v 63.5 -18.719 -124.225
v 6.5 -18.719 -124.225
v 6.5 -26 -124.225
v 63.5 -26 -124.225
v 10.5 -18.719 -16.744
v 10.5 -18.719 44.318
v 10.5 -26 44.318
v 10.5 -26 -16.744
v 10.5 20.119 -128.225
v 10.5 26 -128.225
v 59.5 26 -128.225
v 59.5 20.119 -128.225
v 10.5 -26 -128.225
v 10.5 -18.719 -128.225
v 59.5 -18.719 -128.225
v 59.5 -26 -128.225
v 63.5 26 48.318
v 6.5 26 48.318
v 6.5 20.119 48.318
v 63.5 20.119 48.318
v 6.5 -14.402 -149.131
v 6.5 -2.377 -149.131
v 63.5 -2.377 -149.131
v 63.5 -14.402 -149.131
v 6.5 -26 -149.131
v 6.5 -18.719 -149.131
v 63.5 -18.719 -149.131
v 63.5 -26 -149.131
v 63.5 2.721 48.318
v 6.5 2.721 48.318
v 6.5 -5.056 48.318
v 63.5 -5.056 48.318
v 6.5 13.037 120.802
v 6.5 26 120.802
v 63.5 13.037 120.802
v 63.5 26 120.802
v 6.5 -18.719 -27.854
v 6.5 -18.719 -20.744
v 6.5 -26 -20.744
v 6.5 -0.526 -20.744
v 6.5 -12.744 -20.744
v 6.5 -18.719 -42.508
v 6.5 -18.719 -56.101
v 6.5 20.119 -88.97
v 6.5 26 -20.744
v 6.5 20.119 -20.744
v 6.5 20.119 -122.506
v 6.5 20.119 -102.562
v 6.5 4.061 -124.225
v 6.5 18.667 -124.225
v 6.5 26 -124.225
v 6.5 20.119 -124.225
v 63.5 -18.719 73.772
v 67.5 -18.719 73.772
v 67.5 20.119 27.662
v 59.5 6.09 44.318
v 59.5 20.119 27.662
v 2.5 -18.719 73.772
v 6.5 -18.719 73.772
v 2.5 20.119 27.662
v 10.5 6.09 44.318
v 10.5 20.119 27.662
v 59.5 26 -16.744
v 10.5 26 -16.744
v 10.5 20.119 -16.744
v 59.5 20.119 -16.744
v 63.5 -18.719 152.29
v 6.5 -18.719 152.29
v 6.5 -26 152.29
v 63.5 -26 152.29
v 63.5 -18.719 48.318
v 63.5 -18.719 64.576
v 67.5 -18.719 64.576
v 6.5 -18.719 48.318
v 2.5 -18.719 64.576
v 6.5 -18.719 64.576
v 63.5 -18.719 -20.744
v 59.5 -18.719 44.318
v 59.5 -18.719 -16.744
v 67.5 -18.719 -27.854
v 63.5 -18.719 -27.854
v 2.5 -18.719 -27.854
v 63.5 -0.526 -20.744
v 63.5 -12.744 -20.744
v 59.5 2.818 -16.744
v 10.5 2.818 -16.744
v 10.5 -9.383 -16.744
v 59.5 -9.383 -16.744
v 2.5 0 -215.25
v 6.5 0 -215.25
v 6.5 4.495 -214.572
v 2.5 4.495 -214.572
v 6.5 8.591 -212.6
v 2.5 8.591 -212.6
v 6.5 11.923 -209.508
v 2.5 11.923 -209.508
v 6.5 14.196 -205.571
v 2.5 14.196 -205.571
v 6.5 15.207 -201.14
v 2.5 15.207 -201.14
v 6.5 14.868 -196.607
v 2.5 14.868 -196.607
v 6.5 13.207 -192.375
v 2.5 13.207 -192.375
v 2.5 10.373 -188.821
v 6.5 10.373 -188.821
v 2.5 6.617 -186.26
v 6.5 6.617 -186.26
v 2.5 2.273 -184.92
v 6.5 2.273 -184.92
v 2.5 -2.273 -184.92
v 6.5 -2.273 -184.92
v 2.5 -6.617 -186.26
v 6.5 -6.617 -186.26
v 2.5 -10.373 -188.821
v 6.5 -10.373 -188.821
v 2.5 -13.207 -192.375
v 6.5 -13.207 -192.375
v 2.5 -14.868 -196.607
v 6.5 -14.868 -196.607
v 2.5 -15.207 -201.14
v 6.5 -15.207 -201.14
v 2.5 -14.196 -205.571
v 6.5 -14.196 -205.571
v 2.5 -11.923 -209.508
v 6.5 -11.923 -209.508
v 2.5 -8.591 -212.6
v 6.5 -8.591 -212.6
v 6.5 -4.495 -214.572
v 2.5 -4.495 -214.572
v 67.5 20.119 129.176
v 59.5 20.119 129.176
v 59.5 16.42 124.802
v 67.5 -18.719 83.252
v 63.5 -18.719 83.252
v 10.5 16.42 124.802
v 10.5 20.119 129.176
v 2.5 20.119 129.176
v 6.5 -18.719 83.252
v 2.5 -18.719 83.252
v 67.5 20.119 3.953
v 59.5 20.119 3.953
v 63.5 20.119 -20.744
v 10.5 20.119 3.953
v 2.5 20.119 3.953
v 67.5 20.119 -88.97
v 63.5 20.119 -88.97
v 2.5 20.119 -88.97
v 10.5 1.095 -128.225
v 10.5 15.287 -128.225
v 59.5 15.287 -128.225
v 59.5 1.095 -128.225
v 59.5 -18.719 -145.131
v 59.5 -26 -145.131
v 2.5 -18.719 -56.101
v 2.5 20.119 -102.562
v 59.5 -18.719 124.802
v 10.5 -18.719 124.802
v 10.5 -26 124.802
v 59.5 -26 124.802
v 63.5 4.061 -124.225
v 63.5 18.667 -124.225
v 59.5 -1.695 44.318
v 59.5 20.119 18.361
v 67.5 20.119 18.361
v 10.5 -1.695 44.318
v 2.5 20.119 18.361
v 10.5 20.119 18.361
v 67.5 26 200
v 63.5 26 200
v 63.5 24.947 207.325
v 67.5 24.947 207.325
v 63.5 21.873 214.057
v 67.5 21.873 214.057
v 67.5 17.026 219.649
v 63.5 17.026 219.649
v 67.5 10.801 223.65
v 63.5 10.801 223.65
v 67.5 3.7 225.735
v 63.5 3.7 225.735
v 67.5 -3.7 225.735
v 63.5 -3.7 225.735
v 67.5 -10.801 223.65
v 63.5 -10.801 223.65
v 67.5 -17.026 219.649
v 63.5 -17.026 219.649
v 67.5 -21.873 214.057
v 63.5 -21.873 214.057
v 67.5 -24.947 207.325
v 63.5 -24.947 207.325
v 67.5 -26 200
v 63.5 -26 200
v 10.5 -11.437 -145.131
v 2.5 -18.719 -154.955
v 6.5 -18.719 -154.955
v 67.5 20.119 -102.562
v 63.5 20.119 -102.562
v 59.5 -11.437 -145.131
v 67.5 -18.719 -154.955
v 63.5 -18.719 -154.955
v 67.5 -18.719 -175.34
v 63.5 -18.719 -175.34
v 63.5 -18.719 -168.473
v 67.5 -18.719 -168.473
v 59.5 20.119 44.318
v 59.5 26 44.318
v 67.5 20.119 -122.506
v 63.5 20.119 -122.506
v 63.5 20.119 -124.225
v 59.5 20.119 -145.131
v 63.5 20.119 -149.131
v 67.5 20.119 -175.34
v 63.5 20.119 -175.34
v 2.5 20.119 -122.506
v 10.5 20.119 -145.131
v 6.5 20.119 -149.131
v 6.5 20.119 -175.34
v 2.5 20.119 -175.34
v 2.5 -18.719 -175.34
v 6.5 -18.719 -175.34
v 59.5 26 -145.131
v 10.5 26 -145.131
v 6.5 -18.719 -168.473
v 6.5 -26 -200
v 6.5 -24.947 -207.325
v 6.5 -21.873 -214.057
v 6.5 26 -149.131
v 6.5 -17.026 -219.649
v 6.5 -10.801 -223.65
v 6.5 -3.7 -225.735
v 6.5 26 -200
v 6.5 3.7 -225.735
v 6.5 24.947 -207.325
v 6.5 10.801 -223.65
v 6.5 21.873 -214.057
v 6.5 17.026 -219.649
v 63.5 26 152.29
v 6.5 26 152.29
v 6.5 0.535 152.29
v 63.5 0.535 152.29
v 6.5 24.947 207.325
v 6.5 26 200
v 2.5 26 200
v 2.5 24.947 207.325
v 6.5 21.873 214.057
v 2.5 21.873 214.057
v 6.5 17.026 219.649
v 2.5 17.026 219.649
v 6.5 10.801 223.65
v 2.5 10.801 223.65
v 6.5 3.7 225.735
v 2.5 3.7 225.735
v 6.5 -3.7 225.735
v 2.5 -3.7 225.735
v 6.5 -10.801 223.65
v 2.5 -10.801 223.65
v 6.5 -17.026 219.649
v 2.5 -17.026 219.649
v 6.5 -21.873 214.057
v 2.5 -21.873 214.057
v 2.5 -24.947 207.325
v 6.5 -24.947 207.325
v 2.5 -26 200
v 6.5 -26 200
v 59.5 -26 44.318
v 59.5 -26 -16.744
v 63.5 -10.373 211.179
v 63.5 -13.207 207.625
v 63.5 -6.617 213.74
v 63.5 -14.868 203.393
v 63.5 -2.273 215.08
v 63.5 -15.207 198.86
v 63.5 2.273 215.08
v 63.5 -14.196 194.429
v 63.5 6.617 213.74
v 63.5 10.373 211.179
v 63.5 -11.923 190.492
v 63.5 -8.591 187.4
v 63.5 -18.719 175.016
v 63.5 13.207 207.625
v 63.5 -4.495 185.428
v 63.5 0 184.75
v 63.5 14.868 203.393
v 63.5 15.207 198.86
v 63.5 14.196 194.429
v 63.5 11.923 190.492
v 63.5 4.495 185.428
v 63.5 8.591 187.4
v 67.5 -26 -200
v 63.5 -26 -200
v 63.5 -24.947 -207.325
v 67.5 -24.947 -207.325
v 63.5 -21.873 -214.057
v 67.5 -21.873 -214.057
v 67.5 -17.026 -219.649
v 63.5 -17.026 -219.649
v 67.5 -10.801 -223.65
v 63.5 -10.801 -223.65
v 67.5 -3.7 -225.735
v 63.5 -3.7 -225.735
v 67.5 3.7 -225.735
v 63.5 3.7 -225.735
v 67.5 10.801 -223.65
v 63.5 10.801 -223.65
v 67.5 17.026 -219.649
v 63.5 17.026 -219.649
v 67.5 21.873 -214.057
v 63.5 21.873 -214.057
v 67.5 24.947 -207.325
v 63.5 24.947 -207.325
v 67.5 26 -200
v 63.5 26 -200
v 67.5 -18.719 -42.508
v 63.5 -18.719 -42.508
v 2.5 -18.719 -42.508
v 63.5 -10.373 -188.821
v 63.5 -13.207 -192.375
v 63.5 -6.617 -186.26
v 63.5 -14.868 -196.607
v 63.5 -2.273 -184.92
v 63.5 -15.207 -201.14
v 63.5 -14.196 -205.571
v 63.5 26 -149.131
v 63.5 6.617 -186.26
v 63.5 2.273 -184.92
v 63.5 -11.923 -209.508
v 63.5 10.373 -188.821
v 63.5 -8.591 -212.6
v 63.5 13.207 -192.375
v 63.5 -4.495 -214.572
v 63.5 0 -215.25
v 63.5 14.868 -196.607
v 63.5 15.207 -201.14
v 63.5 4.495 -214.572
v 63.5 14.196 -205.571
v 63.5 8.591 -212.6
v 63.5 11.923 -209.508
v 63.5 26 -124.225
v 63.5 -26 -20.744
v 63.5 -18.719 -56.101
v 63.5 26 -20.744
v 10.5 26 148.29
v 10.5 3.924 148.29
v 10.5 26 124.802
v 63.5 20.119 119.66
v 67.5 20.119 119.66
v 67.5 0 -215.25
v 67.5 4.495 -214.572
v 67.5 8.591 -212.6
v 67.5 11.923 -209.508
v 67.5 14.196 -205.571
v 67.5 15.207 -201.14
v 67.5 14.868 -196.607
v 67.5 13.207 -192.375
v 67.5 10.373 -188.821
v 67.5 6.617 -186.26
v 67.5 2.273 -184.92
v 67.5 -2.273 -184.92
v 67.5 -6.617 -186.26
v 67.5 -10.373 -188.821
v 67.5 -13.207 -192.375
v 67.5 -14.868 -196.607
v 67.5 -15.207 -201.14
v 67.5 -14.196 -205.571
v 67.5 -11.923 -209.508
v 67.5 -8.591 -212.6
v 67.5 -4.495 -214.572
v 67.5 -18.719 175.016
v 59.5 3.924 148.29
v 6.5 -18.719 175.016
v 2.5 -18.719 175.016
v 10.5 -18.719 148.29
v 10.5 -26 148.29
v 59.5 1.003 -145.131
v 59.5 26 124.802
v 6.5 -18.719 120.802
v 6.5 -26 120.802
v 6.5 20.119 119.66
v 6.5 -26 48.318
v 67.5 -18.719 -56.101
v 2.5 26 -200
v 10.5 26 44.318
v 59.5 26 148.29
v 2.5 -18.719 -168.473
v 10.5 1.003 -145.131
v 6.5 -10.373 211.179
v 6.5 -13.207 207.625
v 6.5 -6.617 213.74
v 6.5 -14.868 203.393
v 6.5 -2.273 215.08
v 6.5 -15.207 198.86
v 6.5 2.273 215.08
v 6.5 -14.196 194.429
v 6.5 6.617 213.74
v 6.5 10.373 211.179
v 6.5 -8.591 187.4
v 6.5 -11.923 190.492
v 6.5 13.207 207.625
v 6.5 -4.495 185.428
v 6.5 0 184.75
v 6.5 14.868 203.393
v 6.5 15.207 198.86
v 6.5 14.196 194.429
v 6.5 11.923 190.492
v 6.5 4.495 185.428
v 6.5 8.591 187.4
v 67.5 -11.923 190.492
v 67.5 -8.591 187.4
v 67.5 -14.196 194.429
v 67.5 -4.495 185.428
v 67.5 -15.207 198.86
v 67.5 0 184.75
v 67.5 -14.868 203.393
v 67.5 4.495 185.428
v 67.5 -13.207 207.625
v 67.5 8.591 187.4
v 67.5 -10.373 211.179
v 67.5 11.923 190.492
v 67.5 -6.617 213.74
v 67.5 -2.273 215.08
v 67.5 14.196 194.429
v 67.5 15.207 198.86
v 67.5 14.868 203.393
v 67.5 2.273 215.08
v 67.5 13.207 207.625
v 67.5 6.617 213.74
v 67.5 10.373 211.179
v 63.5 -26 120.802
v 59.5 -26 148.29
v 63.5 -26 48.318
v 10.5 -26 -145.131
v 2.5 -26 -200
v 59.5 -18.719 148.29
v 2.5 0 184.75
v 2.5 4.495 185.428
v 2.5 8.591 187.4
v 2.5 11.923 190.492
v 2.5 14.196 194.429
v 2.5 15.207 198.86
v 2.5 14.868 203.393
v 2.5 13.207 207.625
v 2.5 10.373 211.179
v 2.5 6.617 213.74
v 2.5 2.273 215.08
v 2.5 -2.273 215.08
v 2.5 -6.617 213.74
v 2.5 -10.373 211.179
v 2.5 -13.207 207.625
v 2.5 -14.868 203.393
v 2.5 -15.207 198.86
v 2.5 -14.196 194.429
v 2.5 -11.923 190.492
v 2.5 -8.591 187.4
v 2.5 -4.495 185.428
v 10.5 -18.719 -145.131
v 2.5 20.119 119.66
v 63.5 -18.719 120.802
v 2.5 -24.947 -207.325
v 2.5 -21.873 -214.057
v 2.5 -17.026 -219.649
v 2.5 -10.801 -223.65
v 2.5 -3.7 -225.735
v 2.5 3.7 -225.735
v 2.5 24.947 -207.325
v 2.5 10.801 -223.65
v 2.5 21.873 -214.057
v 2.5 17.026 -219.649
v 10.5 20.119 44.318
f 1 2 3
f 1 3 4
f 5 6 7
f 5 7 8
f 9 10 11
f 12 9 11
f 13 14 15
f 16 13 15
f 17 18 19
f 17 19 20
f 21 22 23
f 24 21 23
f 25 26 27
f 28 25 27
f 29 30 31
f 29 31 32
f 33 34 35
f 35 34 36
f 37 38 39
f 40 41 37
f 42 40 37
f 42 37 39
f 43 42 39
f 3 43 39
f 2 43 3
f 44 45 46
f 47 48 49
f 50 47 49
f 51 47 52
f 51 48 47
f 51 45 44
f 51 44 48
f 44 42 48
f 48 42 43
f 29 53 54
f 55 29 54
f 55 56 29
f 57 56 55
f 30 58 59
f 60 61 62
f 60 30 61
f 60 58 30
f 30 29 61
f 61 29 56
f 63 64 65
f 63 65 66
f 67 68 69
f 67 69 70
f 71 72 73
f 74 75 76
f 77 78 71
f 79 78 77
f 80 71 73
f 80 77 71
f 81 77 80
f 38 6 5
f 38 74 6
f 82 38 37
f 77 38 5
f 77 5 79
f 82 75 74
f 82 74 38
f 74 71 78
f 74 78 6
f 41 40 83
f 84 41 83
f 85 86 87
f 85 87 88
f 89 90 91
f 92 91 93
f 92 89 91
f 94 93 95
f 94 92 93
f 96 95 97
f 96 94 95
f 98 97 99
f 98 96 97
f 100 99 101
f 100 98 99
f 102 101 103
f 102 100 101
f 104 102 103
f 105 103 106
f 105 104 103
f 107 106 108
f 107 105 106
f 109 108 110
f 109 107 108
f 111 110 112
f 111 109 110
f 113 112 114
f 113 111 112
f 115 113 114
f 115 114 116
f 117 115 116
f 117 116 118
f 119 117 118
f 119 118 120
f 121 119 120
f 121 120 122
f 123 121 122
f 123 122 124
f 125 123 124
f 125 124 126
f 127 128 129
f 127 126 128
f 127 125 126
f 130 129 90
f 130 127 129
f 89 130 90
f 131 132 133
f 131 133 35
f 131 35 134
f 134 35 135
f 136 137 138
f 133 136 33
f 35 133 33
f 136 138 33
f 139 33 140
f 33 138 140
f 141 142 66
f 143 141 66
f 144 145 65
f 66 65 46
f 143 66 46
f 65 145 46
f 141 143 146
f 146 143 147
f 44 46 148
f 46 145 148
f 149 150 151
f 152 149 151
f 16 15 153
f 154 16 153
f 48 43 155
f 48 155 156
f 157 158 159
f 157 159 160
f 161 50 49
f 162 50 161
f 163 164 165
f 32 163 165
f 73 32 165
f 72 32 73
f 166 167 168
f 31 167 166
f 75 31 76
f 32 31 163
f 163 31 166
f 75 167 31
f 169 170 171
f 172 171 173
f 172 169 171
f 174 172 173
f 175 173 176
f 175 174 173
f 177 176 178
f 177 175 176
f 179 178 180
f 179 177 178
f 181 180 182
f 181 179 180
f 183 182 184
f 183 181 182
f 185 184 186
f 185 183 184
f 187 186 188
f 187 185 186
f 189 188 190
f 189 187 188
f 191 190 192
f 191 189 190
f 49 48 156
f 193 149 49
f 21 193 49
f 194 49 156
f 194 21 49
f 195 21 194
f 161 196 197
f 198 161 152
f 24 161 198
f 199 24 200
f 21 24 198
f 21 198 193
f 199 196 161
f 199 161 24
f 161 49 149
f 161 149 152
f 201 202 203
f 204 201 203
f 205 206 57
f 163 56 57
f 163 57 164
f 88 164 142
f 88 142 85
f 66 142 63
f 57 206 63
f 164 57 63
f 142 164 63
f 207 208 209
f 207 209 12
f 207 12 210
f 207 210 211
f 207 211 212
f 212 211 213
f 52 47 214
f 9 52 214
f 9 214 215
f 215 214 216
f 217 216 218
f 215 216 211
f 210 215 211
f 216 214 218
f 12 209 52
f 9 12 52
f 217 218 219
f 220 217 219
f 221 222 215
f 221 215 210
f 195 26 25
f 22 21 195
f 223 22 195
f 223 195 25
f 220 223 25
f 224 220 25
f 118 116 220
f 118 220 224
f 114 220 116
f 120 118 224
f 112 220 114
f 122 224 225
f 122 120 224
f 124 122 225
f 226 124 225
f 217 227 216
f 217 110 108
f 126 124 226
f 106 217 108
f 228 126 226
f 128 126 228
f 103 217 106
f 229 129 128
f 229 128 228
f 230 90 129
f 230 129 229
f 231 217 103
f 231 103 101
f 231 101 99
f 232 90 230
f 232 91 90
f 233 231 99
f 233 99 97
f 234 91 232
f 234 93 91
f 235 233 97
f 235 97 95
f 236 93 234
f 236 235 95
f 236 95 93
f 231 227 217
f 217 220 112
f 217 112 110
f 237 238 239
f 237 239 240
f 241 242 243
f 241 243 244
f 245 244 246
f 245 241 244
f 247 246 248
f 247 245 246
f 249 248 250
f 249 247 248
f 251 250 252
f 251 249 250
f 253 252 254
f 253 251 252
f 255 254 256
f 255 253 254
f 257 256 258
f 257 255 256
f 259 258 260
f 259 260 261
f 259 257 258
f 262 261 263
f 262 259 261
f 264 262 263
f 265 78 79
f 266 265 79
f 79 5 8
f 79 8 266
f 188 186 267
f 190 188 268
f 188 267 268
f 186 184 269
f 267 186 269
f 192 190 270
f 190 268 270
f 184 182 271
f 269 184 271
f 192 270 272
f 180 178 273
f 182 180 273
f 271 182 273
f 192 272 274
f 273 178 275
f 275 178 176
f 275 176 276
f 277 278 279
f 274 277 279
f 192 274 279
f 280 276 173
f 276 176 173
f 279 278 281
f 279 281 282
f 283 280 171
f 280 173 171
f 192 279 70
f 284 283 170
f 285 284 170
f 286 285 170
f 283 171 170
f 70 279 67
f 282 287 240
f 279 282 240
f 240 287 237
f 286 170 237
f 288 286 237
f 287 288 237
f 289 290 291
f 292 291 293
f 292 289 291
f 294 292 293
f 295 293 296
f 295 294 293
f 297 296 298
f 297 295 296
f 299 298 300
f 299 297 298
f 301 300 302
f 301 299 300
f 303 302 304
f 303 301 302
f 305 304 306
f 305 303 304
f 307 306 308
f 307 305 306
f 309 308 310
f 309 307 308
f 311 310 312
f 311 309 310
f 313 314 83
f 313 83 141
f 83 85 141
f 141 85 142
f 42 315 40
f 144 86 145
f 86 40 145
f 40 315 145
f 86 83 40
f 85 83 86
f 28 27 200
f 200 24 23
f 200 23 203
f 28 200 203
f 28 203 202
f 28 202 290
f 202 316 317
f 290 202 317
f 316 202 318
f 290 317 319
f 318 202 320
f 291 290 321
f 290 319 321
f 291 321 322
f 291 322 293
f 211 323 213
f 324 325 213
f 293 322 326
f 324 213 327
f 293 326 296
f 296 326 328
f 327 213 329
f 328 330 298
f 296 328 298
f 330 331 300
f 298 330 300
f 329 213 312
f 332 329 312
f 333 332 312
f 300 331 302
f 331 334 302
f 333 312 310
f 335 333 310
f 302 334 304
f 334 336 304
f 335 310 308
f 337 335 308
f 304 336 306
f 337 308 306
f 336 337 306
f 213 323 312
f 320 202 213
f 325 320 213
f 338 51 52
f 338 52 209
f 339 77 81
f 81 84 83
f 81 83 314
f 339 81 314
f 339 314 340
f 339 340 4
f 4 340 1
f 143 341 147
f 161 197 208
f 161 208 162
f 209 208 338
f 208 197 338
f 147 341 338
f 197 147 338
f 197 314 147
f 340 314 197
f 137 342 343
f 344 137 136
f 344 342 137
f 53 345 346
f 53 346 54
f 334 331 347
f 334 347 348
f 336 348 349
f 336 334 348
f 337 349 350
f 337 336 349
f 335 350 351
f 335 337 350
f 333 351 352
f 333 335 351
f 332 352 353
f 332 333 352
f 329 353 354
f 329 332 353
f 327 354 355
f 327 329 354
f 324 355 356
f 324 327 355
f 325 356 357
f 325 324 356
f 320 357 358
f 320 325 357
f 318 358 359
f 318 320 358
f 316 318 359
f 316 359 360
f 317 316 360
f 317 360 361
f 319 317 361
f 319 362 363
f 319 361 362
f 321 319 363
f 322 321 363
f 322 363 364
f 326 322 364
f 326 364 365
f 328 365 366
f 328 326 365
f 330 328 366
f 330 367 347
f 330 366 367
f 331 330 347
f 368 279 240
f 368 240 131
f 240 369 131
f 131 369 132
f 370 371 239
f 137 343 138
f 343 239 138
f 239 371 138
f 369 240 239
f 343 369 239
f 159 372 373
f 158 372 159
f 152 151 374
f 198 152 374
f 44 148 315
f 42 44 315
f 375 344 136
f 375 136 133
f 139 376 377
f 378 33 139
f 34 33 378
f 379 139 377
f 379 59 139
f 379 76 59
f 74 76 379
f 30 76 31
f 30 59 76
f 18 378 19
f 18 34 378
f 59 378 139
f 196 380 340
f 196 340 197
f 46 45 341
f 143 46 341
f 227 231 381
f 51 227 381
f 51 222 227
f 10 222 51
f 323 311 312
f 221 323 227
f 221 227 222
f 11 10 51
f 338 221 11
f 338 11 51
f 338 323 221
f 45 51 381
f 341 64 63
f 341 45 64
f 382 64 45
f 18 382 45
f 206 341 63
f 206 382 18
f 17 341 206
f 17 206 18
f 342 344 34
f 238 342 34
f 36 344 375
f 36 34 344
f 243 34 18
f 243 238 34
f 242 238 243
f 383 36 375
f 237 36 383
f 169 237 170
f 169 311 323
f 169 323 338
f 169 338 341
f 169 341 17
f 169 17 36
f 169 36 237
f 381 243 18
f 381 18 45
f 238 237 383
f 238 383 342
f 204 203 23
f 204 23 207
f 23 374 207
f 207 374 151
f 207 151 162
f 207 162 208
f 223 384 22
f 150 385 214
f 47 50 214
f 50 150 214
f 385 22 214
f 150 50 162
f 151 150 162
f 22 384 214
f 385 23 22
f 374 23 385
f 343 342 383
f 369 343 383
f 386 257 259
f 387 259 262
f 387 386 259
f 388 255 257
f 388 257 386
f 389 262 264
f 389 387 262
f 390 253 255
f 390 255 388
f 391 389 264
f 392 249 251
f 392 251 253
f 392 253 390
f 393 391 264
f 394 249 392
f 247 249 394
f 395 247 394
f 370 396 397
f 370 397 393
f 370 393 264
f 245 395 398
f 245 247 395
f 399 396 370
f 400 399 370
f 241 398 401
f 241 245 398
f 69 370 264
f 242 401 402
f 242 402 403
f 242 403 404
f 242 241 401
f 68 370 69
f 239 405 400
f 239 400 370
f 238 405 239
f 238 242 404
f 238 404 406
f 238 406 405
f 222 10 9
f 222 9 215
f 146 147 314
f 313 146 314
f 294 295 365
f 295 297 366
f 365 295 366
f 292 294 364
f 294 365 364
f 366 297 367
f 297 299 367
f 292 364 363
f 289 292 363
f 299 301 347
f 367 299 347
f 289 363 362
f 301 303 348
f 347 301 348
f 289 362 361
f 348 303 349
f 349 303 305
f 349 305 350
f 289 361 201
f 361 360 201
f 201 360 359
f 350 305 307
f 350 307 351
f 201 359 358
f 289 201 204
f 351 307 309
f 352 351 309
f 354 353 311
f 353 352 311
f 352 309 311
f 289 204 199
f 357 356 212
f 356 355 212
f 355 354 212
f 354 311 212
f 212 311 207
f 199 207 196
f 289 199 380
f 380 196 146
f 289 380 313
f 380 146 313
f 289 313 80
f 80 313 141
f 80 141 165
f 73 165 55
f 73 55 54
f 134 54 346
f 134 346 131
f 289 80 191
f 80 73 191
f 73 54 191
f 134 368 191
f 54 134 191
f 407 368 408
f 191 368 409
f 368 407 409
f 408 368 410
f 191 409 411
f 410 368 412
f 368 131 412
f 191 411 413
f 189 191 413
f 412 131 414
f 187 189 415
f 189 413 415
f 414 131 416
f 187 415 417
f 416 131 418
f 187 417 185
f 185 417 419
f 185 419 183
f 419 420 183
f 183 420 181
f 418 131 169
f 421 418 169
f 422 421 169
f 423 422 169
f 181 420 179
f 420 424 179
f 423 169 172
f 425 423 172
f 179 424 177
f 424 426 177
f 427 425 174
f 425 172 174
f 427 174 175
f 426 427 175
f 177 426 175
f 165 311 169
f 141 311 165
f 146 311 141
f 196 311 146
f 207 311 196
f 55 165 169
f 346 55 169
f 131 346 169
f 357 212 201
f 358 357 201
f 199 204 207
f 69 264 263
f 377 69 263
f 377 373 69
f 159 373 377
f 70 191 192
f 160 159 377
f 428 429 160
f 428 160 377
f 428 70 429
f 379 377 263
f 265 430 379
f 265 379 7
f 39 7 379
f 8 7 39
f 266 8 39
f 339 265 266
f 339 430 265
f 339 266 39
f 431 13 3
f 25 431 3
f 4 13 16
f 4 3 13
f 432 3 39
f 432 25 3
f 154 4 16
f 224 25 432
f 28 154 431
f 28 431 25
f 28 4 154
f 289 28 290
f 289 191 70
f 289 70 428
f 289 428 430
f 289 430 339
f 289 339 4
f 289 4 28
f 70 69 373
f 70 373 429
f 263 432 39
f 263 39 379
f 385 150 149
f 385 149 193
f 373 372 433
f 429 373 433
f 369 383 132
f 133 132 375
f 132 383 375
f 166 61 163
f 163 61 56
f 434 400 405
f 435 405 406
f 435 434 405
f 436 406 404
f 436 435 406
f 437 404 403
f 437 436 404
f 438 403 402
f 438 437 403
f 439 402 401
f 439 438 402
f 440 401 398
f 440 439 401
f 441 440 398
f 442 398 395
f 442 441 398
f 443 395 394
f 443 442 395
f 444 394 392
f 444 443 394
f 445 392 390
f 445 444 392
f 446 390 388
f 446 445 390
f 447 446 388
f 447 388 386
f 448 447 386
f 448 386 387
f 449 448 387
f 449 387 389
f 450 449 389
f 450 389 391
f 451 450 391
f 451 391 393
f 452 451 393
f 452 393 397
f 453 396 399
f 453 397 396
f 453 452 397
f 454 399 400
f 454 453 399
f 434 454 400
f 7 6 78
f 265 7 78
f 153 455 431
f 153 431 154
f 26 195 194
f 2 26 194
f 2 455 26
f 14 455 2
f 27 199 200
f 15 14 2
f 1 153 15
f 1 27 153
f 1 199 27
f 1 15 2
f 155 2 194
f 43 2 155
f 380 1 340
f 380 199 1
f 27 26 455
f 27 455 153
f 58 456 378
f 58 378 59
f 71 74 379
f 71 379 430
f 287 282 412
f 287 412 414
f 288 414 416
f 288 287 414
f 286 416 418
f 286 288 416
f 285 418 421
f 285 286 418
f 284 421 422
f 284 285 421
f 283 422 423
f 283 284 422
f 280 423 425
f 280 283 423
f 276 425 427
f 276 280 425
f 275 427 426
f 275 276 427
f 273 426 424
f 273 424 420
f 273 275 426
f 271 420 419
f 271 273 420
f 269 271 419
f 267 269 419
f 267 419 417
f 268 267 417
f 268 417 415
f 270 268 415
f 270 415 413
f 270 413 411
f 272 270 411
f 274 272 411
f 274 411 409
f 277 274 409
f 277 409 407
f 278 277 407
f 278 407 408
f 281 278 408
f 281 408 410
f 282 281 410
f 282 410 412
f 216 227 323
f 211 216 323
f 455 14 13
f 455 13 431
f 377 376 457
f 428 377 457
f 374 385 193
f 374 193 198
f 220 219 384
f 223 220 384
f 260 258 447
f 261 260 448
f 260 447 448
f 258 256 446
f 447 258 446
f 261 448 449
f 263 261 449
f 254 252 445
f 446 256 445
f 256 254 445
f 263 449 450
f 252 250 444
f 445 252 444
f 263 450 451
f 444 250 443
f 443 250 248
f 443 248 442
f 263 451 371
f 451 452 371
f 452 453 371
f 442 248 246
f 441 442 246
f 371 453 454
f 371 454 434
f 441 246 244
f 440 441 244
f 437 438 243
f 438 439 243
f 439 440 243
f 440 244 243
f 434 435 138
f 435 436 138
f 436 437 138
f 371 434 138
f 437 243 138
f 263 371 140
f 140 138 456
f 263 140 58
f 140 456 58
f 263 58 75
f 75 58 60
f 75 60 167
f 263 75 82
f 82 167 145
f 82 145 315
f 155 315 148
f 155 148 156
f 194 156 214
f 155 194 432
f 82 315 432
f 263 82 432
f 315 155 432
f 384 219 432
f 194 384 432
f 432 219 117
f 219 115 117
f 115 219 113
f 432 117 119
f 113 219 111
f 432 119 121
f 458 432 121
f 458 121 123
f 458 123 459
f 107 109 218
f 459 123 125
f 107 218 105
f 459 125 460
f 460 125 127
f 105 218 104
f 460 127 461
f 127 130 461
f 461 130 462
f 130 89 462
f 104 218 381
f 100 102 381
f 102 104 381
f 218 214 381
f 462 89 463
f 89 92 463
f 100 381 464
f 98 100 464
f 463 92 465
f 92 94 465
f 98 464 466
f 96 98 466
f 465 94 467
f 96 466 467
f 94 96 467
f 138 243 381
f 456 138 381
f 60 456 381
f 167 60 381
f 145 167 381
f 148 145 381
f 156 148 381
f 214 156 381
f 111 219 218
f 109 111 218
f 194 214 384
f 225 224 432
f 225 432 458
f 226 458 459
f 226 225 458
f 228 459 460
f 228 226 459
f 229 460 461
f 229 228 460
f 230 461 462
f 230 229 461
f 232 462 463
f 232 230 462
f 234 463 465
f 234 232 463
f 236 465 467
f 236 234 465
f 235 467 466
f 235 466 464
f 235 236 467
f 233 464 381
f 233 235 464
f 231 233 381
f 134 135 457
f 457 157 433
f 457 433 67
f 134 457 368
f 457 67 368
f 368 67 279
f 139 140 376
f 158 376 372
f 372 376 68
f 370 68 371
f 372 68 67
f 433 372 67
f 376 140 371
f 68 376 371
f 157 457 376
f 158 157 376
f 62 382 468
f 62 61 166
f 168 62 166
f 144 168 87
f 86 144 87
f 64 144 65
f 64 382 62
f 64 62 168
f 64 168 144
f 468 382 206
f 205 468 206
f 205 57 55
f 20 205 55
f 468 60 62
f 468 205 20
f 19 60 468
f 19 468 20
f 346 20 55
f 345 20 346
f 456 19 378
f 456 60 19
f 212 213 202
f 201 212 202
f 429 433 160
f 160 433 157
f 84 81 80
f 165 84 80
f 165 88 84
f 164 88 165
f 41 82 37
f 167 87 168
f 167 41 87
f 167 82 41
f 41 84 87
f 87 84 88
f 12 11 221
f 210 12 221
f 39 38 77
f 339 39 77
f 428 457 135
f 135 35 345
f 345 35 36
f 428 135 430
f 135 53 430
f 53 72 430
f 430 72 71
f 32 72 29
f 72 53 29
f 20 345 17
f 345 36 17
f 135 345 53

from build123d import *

# Parameters (mm, degrees)
CROQUIS1_R              = 15.25
SALIENTE_EXTRUIR1_DEPTH = 70
CROQUIS2_W              = 57
CROQUIS2_H              = 84.437125565
CROQUIS2_H_2            = 89.497342593
CROQUIS2_H_3            = 103.4811418
CROQUIS2_H_4            = 72.483550253
CORTAR_EXTRUIR1_DEPTH   = 70
CORTAR_EXTRUIR2_DEPTH   = 70
CROQUIS4_R              = 15.25
CORTAR_EXTRUIR3_DEPTH   = 2.5
CROQUIS5_R              = 15.25
CORTAR_EXTRUIR4_DEPTH   = 2.5
CROQUIS6_W              = 49
CROQUIS6_H              = 61.062323931
CORTAR_EXTRUIR5_DEPTH   = 70
CROQUIS7_W              = 49
CROQUIS7_H              = 23.488755438
CORTAR_EXTRUIR6_DEPTH   = 70
CROQUIS8_W              = 49
CROQUIS8_H              = 16.905630738
CORTAR_EXTRUIR7_DEPTH   = 70
CORTAR_EXTRUIR8_DEPTH   = 75


with BuildPart() as part:
    # Croquis1 → Saliente-Extruir1 (new body)
    with BuildSketch(Plane(origin=(0, 0, 0), x_dir=(0, 0, -1), z_dir=(1, 0, 0))):
        with BuildLine():
            Line((-200, 35), (200, 35))
            ThreePointArc((200, 35), (235, 0), (200, -35))
            Line((200, -35), (-200, -35))
            ThreePointArc((-200, -35), (-235, 0), (-200, 35))
        make_face()
        with Locations((-200, 0)):
            Circle(CROQUIS1_R, mode=Mode.SUBTRACT)
        with Locations((200, 0)):
            Circle(CROQUIS1_R, mode=Mode.SUBTRACT)
    extrude(amount=SALIENTE_EXTRUIR1_DEPTH)

    # Croquis2 → Cortar-Extruir1 (cut)
    with BuildSketch(Plane(origin=(0, 35, 0), x_dir=(1, 0, 0), z_dir=(0, 1, 0))):
        with Locations((35, -194.508891983)):
            Rectangle(CROQUIS2_W, CROQUIS2_H)
        with Locations((35, 193.879744257)):
            Rectangle(CROQUIS2_W, CROQUIS2_H_2)
        with Locations((35, 72.484871322)):
            Rectangle(CROQUIS2_W, CROQUIS2_H_3)
        with Locations((35, -84.559798636)):
            Rectangle(CROQUIS2_W, CROQUIS2_H_4)
    extrude(amount=-CORTAR_EXTRUIR1_DEPTH, mode=Mode.SUBTRACT)

    # Croquis3 → Cortar-Extruir2 (cut)
    with BuildSketch(Plane(origin=(70, 0, 0), x_dir=(0, 0, -1), z_dir=(1, 0, 0))):
        with BuildLine():
            Line((-200, -35), (200, -35))
            ThreePointArc((200, -35), (235, 0), (200, 35))
            Line((200, 35), (-200, 35))
            ThreePointArc((-200, 35), (-235, 0), (-200, -35))
        make_face()
        with BuildLine():
            ThreePointArc((-200, 26), (-226, 0), (-200, -26))
            Line((-200, -26), (200, -26))
            ThreePointArc((200, -26), (226, 0), (200, 26))
            Line((200, 26), (-200, 26))
        make_face(mode=Mode.SUBTRACT)
    extrude(amount=-CORTAR_EXTRUIR2_DEPTH, mode=Mode.SUBTRACT)

    # Croquis4 → Cortar-Extruir3 (cut)
    with BuildSketch(Plane(origin=(70, 0, 0), x_dir=(0, 0, -1), z_dir=(1, 0, 0))):
        with BuildLine():
            Line((-200, 26), (200, 26))
            ThreePointArc((200, 26), (226, 0), (200, -26))
            Line((200, -26), (-200, -26))
            ThreePointArc((-200, -26), (-226, 0), (-200, 26))
        make_face()
        with Locations((-200, 0)):
            Circle(CROQUIS4_R, mode=Mode.SUBTRACT)
    extrude(amount=-CORTAR_EXTRUIR3_DEPTH, mode=Mode.SUBTRACT)

    # Croquis5 → Cortar-Extruir4 (cut)
    with BuildSketch(Plane.ZY):
        with BuildLine():
            Line((-200, 26), (200, 26))
            ThreePointArc((200, 26), (226, 0), (200, -26))
            Line((200, -26), (-200, -26))
            ThreePointArc((-200, -26), (-226, 0), (-200, 26))
        make_face()
        with Locations((200, 0)):
            Circle(CROQUIS5_R, mode=Mode.SUBTRACT)
        with Locations((-200, 0)):
            Circle(CROQUIS5_R, mode=Mode.SUBTRACT)
    extrude(amount=-CORTAR_EXTRUIR4_DEPTH, mode=Mode.SUBTRACT)

    # Croquis6 → Cortar-Extruir5 (cut)
    with BuildSketch(Plane(origin=(0, 26, 0), x_dir=(1, 0, 0), z_dir=(0, 1, 0))):
        with Locations((35, -13.786861543)):
            Rectangle(CROQUIS6_W, CROQUIS6_H)
    extrude(amount=-CORTAR_EXTRUIR5_DEPTH, mode=Mode.SUBTRACT)

    # Croquis7 → Cortar-Extruir6 (cut)
    with BuildSketch(Plane(origin=(0, 26, 0), x_dir=(1, 0, 0), z_dir=(0, 1, 0))):
        with Locations((35, -136.545951481)):
            Rectangle(CROQUIS7_W, CROQUIS7_H)
    extrude(amount=-CORTAR_EXTRUIR6_DEPTH, mode=Mode.SUBTRACT)

    # Croquis8 → Cortar-Extruir7 (cut)
    with BuildSketch(Plane(origin=(0, 26, 0), x_dir=(1, 0, 0), z_dir=(0, 1, 0))):
        with Locations((35, 136.678257591)):
            Rectangle(CROQUIS8_W, CROQUIS8_H)
    extrude(amount=-CORTAR_EXTRUIR7_DEPTH, mode=Mode.SUBTRACT)

    # Croquis9 → Cortar-Extruir8 (cut, symmetric)
    with BuildSketch(Plane(origin=(0, 0, 0), x_dir=(0, 0, -1), z_dir=(1, 0, 0))):
        Polygon((-175.016247614, -18.719139012), (-129.175761304, 20.119342374), (-83.252481771, -18.719139012), align=None)
        Polygon((-64.5759486, -18.719139012), (27.853775471, -18.719139012), (-18.361086565, 20.119342374), align=None)
        Polygon((-3.953316698, 20.119342374), (88.969737905, 20.119342374), (42.508210603, -18.719139012), align=None)
        Polygon((175.339862658, 20.119342374), (175.339862658, -18.719139012), (168.473319463, -18.719139012), (122.506063728, 20.119342374), align=None)
        Polygon((-119.659693674, 20.119342374), (-73.771877896, -18.719139012), (-27.662190874, 20.119342374), align=None)
        Polygon((56.100678697, -18.719139012), (102.562205998, 20.119342374), (154.954992104, -18.719139012), align=None)
    extrude(amount=CORTAR_EXTRUIR8_DEPTH, both=True, mode=Mode.SUBTRACT)


solid = part.part
